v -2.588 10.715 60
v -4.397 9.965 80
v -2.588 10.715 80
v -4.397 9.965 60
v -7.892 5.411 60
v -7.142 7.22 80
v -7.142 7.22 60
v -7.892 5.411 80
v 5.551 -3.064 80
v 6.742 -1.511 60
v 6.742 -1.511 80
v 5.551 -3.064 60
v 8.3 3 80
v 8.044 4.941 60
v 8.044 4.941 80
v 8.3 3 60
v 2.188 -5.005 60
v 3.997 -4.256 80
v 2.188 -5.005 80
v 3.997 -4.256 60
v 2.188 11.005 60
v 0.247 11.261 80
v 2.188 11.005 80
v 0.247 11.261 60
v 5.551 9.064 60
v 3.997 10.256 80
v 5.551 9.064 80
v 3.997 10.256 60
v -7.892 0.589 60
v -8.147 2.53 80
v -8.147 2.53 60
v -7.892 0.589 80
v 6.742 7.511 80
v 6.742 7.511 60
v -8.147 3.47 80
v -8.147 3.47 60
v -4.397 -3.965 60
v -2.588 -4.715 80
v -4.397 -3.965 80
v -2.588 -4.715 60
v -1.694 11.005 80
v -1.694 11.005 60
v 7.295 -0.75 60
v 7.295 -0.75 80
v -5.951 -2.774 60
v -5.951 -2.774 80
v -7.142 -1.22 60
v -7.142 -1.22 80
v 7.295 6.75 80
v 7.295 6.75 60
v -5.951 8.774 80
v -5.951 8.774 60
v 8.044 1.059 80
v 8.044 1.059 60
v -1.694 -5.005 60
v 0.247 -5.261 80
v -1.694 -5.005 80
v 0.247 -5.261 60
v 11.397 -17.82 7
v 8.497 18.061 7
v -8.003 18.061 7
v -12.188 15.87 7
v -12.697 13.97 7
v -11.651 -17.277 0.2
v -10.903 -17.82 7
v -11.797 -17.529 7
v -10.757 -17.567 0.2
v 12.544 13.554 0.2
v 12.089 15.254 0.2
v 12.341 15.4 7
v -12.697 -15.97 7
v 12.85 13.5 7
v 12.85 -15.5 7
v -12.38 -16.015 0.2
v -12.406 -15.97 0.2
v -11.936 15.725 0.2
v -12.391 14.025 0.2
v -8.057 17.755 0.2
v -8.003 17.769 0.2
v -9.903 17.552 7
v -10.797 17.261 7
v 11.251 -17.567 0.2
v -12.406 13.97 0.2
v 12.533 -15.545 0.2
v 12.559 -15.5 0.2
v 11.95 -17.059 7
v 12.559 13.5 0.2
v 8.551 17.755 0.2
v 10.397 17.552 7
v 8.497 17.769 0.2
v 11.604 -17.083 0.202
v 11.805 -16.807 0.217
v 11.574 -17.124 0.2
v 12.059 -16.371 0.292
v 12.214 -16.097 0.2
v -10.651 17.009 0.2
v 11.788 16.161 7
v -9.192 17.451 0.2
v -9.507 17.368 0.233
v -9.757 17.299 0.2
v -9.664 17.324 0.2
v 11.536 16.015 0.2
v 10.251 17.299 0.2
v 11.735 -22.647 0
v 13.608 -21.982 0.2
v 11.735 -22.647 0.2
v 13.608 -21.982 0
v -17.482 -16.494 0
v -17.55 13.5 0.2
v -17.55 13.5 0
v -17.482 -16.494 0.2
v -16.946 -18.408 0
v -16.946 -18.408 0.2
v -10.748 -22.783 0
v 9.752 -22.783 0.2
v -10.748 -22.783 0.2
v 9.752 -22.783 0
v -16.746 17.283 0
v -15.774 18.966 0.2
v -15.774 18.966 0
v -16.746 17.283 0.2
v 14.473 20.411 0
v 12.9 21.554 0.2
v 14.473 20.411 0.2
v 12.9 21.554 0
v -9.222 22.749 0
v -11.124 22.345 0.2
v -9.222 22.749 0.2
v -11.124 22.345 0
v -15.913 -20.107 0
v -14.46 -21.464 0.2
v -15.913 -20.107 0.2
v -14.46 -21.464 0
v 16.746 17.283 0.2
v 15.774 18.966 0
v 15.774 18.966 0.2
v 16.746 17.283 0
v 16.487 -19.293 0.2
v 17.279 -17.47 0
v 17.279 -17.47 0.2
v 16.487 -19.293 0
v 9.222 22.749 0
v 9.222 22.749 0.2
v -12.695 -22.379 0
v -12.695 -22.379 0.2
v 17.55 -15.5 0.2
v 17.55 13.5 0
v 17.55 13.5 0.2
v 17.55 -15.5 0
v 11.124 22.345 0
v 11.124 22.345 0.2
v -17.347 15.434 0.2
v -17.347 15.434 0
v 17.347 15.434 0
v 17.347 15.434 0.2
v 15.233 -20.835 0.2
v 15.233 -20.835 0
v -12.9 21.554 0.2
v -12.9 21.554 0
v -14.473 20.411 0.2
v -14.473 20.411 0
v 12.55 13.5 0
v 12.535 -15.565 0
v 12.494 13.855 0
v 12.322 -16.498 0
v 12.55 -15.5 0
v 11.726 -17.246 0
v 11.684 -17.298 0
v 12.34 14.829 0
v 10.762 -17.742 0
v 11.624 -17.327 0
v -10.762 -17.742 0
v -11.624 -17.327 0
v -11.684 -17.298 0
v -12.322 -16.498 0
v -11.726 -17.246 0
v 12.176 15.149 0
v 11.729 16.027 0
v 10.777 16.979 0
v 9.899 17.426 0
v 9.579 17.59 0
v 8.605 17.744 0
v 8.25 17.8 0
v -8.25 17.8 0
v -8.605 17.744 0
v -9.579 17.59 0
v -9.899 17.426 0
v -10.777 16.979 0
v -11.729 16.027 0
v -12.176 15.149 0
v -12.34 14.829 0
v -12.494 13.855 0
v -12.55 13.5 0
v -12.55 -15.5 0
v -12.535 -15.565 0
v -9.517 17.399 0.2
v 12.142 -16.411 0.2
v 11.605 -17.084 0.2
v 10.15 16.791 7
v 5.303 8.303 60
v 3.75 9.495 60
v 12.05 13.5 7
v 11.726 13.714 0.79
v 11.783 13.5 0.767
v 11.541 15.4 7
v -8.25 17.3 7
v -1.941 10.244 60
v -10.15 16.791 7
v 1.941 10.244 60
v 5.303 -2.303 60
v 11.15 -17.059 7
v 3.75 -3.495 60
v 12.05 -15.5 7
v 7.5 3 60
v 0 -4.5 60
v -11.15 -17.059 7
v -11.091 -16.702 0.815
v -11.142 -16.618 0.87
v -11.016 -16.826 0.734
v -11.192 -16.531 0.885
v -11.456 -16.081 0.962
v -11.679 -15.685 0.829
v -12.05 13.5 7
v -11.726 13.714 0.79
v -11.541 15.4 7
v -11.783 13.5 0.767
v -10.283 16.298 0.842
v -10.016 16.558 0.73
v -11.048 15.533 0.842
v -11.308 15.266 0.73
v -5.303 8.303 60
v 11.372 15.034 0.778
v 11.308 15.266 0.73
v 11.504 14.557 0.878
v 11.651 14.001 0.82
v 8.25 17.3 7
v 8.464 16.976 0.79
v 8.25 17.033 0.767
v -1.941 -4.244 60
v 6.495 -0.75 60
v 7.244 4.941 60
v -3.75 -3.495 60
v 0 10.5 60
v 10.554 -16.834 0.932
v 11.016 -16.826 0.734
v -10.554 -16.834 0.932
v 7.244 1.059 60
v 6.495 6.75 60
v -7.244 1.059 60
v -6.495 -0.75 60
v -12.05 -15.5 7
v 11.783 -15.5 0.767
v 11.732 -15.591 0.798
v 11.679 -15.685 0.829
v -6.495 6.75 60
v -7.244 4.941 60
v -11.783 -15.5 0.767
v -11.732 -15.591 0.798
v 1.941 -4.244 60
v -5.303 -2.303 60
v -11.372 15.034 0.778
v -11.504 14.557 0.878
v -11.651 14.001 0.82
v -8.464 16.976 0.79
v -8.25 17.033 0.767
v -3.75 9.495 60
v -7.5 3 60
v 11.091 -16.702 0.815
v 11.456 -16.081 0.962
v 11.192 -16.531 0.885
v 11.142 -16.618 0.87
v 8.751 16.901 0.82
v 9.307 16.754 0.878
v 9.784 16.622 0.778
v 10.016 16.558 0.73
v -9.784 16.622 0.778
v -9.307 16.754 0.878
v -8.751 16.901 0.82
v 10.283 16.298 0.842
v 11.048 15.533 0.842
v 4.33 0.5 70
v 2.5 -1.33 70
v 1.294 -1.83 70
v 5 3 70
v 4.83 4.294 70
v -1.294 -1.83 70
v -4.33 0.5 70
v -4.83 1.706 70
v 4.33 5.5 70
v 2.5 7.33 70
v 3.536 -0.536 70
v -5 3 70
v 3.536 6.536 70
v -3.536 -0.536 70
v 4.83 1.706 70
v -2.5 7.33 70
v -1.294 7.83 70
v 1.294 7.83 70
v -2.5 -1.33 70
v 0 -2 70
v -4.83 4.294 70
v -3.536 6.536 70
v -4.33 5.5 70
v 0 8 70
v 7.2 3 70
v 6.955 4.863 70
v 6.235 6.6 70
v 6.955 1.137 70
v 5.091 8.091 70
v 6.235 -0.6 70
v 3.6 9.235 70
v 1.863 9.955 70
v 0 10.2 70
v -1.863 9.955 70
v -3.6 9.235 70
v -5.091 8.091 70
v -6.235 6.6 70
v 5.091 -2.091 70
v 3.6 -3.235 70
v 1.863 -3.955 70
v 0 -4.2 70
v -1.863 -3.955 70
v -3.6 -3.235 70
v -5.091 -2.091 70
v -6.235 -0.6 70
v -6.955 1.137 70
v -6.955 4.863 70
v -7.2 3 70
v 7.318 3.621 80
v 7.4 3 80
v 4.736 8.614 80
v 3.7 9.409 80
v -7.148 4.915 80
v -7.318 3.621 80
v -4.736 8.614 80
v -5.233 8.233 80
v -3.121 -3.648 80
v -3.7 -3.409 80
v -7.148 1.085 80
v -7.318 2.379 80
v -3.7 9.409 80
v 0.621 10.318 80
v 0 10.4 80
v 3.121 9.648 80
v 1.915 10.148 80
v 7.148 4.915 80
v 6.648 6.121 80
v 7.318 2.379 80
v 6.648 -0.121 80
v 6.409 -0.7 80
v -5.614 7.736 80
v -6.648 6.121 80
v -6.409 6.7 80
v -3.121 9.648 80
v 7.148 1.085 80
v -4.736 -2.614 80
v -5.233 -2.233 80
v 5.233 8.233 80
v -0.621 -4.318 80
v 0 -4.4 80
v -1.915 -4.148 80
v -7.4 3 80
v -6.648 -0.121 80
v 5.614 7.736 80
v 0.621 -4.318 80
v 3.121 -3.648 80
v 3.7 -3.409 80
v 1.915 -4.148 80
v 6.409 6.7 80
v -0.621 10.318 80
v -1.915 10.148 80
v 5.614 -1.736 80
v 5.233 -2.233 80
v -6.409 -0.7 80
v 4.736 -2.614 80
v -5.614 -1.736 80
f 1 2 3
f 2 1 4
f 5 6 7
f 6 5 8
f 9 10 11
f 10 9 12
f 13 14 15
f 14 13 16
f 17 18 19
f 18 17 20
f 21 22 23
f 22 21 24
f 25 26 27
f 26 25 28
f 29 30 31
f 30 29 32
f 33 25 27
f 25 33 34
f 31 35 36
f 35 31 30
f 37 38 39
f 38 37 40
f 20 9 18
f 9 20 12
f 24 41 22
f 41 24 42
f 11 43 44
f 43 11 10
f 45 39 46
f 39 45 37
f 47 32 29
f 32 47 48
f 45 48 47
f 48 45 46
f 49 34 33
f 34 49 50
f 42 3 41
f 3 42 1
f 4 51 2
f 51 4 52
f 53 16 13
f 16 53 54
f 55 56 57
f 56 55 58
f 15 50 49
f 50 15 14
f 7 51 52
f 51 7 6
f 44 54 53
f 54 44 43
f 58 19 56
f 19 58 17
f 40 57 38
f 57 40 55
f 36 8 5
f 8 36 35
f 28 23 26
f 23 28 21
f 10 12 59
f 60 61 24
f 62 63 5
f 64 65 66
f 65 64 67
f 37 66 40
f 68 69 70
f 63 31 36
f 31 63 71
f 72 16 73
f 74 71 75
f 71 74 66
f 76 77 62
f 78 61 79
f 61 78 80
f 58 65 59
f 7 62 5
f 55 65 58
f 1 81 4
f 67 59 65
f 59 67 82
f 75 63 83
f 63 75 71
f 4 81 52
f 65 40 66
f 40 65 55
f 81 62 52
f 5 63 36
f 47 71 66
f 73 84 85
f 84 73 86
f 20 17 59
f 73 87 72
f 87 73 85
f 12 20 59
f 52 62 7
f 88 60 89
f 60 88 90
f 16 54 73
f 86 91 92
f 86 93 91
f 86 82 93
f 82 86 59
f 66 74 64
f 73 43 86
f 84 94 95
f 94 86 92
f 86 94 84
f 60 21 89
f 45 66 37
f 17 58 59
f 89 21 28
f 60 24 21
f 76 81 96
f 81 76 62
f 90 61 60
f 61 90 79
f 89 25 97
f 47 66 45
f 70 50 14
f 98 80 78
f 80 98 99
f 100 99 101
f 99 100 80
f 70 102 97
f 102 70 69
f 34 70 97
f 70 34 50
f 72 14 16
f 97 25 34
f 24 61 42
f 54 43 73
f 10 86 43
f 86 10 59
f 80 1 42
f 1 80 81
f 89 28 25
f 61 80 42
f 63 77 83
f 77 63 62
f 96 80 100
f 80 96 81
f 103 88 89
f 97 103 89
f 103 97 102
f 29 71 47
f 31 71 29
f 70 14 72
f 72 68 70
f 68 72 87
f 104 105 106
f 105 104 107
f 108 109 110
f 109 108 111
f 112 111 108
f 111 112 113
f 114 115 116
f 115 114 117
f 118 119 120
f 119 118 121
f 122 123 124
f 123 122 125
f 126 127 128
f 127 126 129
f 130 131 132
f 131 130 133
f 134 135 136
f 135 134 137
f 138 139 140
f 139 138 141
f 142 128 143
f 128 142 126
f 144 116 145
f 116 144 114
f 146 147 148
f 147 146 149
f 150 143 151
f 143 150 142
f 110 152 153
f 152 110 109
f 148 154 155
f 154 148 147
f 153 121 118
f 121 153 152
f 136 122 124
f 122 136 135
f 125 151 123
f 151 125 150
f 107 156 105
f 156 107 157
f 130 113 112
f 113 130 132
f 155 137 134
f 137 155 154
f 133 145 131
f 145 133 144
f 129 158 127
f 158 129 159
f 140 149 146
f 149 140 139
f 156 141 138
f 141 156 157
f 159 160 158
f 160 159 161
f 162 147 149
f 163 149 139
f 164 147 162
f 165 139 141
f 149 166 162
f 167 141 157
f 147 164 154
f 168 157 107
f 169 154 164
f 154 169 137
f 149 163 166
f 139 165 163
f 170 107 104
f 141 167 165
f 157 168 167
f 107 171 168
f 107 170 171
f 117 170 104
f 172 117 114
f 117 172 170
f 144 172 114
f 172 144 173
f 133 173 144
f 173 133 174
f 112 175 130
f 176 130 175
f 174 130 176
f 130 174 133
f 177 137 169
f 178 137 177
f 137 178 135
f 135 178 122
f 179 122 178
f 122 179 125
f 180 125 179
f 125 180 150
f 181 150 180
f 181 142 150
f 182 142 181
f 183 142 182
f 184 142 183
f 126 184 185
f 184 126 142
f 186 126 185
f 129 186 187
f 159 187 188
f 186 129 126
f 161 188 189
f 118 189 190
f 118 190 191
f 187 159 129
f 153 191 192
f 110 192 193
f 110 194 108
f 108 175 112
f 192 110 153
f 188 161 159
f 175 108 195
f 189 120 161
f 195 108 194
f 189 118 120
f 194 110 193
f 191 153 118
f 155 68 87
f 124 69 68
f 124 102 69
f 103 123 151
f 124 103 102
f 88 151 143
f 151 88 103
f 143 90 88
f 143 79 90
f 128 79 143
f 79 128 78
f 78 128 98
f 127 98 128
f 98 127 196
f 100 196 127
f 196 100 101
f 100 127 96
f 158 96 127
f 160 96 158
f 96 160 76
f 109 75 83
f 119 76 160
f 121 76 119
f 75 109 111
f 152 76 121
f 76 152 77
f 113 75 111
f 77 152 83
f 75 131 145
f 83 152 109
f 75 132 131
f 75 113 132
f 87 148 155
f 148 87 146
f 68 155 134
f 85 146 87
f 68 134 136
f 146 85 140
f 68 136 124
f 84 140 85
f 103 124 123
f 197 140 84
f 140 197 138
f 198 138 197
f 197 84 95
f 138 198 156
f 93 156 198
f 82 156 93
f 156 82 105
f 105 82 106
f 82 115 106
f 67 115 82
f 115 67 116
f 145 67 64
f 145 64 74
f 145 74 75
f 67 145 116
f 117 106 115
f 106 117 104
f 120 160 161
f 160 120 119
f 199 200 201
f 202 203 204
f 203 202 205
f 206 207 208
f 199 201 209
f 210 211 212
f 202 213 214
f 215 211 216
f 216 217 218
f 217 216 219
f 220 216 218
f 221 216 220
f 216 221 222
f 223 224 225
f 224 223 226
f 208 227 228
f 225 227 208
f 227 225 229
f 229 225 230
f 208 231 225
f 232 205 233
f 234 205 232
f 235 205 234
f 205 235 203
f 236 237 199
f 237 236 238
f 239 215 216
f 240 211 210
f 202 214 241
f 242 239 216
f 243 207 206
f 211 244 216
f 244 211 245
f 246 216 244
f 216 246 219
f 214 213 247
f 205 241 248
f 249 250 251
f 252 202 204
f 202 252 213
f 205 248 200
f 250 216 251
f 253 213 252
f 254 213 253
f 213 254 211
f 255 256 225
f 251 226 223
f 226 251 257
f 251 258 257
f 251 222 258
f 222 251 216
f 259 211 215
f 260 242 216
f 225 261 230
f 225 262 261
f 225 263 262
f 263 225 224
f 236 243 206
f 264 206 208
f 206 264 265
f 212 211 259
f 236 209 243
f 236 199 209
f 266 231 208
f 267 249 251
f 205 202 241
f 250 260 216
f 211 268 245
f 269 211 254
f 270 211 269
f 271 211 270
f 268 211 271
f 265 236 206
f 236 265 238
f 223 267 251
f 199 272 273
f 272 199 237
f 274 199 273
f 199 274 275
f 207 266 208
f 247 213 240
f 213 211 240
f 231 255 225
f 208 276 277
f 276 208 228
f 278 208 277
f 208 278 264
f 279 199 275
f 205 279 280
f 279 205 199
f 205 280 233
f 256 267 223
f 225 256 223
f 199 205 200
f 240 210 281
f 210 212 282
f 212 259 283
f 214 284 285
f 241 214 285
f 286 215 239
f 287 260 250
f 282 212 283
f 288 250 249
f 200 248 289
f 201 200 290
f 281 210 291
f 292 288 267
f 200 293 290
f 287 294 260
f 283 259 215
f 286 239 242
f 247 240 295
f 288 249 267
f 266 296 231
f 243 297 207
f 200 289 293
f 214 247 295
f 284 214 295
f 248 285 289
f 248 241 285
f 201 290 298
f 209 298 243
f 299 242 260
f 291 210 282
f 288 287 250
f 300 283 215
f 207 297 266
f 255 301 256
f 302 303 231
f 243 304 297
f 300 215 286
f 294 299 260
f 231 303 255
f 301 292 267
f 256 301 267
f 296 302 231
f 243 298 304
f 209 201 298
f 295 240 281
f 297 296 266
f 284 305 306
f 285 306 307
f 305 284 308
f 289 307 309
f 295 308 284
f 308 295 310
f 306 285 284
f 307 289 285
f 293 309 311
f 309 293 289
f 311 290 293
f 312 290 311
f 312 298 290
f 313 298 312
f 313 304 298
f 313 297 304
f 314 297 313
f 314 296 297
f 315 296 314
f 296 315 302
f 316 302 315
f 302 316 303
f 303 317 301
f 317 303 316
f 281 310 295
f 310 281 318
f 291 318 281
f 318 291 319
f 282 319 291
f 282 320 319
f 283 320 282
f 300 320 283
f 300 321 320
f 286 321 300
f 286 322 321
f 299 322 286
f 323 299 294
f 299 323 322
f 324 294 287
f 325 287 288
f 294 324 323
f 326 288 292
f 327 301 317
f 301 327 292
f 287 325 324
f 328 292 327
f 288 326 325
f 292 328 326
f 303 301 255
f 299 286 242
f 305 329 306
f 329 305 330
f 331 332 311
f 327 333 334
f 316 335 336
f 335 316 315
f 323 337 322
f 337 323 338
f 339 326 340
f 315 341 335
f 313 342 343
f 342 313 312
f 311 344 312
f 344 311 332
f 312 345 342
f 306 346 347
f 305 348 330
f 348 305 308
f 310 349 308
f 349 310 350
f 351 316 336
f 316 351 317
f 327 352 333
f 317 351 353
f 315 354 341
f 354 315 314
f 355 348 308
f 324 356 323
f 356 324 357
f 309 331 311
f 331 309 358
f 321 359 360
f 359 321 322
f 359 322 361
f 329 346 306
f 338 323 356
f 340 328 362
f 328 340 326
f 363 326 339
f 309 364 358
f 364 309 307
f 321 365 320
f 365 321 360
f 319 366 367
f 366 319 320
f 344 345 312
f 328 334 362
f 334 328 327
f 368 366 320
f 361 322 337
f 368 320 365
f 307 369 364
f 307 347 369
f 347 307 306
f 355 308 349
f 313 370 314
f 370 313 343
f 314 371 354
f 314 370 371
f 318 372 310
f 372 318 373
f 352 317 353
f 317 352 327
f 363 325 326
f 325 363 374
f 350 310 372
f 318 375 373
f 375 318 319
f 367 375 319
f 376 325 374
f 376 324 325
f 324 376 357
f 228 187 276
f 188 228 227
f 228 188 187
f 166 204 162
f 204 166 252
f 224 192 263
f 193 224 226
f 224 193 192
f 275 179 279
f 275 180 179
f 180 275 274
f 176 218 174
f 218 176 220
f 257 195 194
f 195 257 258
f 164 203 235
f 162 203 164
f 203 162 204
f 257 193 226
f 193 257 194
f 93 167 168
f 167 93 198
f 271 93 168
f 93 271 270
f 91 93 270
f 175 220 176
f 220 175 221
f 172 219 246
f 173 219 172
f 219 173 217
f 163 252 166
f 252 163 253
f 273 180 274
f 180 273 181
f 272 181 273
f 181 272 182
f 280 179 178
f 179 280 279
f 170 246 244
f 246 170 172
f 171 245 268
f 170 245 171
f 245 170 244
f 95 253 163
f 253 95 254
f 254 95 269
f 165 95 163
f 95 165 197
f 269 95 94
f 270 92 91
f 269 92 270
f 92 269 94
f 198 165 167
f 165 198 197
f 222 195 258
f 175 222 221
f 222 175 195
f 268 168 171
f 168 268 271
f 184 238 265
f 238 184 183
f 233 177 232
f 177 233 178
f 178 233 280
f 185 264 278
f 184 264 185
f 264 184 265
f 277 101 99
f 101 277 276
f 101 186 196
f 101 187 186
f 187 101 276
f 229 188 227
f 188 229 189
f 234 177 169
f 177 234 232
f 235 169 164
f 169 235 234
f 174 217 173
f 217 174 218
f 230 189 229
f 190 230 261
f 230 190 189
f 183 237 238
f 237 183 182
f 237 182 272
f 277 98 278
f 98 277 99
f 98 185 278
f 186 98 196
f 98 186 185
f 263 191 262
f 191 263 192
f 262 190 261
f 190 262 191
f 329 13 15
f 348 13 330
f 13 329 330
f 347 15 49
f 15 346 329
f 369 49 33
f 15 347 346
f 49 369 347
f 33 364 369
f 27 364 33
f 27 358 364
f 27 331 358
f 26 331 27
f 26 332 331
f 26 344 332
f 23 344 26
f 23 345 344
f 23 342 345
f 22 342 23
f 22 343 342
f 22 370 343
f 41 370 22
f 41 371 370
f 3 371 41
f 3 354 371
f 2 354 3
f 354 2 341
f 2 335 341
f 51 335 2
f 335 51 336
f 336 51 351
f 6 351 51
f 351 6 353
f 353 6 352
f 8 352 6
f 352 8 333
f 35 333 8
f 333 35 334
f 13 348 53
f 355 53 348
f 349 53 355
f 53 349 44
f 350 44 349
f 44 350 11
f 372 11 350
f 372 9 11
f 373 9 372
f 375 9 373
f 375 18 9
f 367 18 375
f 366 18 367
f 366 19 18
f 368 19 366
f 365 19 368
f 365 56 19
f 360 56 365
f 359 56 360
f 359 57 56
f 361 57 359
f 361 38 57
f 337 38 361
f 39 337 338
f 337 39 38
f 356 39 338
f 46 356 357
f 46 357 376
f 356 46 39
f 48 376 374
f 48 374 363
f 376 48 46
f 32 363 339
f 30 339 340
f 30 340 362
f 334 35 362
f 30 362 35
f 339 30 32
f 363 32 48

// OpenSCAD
//$fa=1;
//$fs=.5;

cl=0.2;
l=36-2*cl;
w=30-2-2.5-2*cl;
d=3;
r1=4.5-cl;
r2=2.5-cl;
th=.8;

od=11;
id=0;
t=8;
od=15;

t=10;

h=80;

brim=true;
//brim=false;
xsec=false;
//xsec=true;

module orifice(r1a,r1b,r2a,r2b,h) {
	hull() {
		for(x=[-w/2+r1,w/2-r1]) translate([x,l/2-r1,0]) cylinder(h,r1a,r1b,false);
		for(x=[-w/2+r2,w/2-r2]) translate([x,-l/2+r2,0]) cylinder(h,r2a,r2b,false);
	}
}

module funnel() {
	hull() {
		orifice(r1-th,r1+.3-th,r2-th,r2+.3-th,7);
		translate([0,d,h-21]) cylinder(1,od/2,od/2,false);
	}
}

difference() {
	union() {
		minkowski() {
			union() {
				funnel();
				translate([0,d,0]) cylinder(h,od/2,od/2,false);
			}
			sphere(th);
		}

		//Brim
		if(brim==true) orifice(r1+5,r1+5,r2+5,r2+5,.2);
	}
	funnel();
	translate([0,d,h-20]) cylinder(10,od/2,t/2,false);
	translate([0,d,h-10]) cylinder(15,od/2-.3,od/2,false);
	translate([0,0,-2]) orifice(r1+2,r1-2,r2+2,r2-2,4);
	translate([0,0,-2]) cube([2*w,2*l,4],true);
	//cylinder(100,(t-2)/2,(t-2)/2,false);
	translate([0,0,h])cylinder(10,20,20,false);

	if (xsec==true) rotate([0,0,90]) translate([0,0,-50]) cube([l,w*2,h*2],false);
}
//cube([w-r1-r2,l-r1-r2,2],true);
//color("Black") translate([w/2-0.75,0,2.25]) rotate([90,0,0]) cylinder(10,2.5/2,2.5/2,true);

//translate([0,-150,0]) rotate([-15,0,0]) cube(100,false);
